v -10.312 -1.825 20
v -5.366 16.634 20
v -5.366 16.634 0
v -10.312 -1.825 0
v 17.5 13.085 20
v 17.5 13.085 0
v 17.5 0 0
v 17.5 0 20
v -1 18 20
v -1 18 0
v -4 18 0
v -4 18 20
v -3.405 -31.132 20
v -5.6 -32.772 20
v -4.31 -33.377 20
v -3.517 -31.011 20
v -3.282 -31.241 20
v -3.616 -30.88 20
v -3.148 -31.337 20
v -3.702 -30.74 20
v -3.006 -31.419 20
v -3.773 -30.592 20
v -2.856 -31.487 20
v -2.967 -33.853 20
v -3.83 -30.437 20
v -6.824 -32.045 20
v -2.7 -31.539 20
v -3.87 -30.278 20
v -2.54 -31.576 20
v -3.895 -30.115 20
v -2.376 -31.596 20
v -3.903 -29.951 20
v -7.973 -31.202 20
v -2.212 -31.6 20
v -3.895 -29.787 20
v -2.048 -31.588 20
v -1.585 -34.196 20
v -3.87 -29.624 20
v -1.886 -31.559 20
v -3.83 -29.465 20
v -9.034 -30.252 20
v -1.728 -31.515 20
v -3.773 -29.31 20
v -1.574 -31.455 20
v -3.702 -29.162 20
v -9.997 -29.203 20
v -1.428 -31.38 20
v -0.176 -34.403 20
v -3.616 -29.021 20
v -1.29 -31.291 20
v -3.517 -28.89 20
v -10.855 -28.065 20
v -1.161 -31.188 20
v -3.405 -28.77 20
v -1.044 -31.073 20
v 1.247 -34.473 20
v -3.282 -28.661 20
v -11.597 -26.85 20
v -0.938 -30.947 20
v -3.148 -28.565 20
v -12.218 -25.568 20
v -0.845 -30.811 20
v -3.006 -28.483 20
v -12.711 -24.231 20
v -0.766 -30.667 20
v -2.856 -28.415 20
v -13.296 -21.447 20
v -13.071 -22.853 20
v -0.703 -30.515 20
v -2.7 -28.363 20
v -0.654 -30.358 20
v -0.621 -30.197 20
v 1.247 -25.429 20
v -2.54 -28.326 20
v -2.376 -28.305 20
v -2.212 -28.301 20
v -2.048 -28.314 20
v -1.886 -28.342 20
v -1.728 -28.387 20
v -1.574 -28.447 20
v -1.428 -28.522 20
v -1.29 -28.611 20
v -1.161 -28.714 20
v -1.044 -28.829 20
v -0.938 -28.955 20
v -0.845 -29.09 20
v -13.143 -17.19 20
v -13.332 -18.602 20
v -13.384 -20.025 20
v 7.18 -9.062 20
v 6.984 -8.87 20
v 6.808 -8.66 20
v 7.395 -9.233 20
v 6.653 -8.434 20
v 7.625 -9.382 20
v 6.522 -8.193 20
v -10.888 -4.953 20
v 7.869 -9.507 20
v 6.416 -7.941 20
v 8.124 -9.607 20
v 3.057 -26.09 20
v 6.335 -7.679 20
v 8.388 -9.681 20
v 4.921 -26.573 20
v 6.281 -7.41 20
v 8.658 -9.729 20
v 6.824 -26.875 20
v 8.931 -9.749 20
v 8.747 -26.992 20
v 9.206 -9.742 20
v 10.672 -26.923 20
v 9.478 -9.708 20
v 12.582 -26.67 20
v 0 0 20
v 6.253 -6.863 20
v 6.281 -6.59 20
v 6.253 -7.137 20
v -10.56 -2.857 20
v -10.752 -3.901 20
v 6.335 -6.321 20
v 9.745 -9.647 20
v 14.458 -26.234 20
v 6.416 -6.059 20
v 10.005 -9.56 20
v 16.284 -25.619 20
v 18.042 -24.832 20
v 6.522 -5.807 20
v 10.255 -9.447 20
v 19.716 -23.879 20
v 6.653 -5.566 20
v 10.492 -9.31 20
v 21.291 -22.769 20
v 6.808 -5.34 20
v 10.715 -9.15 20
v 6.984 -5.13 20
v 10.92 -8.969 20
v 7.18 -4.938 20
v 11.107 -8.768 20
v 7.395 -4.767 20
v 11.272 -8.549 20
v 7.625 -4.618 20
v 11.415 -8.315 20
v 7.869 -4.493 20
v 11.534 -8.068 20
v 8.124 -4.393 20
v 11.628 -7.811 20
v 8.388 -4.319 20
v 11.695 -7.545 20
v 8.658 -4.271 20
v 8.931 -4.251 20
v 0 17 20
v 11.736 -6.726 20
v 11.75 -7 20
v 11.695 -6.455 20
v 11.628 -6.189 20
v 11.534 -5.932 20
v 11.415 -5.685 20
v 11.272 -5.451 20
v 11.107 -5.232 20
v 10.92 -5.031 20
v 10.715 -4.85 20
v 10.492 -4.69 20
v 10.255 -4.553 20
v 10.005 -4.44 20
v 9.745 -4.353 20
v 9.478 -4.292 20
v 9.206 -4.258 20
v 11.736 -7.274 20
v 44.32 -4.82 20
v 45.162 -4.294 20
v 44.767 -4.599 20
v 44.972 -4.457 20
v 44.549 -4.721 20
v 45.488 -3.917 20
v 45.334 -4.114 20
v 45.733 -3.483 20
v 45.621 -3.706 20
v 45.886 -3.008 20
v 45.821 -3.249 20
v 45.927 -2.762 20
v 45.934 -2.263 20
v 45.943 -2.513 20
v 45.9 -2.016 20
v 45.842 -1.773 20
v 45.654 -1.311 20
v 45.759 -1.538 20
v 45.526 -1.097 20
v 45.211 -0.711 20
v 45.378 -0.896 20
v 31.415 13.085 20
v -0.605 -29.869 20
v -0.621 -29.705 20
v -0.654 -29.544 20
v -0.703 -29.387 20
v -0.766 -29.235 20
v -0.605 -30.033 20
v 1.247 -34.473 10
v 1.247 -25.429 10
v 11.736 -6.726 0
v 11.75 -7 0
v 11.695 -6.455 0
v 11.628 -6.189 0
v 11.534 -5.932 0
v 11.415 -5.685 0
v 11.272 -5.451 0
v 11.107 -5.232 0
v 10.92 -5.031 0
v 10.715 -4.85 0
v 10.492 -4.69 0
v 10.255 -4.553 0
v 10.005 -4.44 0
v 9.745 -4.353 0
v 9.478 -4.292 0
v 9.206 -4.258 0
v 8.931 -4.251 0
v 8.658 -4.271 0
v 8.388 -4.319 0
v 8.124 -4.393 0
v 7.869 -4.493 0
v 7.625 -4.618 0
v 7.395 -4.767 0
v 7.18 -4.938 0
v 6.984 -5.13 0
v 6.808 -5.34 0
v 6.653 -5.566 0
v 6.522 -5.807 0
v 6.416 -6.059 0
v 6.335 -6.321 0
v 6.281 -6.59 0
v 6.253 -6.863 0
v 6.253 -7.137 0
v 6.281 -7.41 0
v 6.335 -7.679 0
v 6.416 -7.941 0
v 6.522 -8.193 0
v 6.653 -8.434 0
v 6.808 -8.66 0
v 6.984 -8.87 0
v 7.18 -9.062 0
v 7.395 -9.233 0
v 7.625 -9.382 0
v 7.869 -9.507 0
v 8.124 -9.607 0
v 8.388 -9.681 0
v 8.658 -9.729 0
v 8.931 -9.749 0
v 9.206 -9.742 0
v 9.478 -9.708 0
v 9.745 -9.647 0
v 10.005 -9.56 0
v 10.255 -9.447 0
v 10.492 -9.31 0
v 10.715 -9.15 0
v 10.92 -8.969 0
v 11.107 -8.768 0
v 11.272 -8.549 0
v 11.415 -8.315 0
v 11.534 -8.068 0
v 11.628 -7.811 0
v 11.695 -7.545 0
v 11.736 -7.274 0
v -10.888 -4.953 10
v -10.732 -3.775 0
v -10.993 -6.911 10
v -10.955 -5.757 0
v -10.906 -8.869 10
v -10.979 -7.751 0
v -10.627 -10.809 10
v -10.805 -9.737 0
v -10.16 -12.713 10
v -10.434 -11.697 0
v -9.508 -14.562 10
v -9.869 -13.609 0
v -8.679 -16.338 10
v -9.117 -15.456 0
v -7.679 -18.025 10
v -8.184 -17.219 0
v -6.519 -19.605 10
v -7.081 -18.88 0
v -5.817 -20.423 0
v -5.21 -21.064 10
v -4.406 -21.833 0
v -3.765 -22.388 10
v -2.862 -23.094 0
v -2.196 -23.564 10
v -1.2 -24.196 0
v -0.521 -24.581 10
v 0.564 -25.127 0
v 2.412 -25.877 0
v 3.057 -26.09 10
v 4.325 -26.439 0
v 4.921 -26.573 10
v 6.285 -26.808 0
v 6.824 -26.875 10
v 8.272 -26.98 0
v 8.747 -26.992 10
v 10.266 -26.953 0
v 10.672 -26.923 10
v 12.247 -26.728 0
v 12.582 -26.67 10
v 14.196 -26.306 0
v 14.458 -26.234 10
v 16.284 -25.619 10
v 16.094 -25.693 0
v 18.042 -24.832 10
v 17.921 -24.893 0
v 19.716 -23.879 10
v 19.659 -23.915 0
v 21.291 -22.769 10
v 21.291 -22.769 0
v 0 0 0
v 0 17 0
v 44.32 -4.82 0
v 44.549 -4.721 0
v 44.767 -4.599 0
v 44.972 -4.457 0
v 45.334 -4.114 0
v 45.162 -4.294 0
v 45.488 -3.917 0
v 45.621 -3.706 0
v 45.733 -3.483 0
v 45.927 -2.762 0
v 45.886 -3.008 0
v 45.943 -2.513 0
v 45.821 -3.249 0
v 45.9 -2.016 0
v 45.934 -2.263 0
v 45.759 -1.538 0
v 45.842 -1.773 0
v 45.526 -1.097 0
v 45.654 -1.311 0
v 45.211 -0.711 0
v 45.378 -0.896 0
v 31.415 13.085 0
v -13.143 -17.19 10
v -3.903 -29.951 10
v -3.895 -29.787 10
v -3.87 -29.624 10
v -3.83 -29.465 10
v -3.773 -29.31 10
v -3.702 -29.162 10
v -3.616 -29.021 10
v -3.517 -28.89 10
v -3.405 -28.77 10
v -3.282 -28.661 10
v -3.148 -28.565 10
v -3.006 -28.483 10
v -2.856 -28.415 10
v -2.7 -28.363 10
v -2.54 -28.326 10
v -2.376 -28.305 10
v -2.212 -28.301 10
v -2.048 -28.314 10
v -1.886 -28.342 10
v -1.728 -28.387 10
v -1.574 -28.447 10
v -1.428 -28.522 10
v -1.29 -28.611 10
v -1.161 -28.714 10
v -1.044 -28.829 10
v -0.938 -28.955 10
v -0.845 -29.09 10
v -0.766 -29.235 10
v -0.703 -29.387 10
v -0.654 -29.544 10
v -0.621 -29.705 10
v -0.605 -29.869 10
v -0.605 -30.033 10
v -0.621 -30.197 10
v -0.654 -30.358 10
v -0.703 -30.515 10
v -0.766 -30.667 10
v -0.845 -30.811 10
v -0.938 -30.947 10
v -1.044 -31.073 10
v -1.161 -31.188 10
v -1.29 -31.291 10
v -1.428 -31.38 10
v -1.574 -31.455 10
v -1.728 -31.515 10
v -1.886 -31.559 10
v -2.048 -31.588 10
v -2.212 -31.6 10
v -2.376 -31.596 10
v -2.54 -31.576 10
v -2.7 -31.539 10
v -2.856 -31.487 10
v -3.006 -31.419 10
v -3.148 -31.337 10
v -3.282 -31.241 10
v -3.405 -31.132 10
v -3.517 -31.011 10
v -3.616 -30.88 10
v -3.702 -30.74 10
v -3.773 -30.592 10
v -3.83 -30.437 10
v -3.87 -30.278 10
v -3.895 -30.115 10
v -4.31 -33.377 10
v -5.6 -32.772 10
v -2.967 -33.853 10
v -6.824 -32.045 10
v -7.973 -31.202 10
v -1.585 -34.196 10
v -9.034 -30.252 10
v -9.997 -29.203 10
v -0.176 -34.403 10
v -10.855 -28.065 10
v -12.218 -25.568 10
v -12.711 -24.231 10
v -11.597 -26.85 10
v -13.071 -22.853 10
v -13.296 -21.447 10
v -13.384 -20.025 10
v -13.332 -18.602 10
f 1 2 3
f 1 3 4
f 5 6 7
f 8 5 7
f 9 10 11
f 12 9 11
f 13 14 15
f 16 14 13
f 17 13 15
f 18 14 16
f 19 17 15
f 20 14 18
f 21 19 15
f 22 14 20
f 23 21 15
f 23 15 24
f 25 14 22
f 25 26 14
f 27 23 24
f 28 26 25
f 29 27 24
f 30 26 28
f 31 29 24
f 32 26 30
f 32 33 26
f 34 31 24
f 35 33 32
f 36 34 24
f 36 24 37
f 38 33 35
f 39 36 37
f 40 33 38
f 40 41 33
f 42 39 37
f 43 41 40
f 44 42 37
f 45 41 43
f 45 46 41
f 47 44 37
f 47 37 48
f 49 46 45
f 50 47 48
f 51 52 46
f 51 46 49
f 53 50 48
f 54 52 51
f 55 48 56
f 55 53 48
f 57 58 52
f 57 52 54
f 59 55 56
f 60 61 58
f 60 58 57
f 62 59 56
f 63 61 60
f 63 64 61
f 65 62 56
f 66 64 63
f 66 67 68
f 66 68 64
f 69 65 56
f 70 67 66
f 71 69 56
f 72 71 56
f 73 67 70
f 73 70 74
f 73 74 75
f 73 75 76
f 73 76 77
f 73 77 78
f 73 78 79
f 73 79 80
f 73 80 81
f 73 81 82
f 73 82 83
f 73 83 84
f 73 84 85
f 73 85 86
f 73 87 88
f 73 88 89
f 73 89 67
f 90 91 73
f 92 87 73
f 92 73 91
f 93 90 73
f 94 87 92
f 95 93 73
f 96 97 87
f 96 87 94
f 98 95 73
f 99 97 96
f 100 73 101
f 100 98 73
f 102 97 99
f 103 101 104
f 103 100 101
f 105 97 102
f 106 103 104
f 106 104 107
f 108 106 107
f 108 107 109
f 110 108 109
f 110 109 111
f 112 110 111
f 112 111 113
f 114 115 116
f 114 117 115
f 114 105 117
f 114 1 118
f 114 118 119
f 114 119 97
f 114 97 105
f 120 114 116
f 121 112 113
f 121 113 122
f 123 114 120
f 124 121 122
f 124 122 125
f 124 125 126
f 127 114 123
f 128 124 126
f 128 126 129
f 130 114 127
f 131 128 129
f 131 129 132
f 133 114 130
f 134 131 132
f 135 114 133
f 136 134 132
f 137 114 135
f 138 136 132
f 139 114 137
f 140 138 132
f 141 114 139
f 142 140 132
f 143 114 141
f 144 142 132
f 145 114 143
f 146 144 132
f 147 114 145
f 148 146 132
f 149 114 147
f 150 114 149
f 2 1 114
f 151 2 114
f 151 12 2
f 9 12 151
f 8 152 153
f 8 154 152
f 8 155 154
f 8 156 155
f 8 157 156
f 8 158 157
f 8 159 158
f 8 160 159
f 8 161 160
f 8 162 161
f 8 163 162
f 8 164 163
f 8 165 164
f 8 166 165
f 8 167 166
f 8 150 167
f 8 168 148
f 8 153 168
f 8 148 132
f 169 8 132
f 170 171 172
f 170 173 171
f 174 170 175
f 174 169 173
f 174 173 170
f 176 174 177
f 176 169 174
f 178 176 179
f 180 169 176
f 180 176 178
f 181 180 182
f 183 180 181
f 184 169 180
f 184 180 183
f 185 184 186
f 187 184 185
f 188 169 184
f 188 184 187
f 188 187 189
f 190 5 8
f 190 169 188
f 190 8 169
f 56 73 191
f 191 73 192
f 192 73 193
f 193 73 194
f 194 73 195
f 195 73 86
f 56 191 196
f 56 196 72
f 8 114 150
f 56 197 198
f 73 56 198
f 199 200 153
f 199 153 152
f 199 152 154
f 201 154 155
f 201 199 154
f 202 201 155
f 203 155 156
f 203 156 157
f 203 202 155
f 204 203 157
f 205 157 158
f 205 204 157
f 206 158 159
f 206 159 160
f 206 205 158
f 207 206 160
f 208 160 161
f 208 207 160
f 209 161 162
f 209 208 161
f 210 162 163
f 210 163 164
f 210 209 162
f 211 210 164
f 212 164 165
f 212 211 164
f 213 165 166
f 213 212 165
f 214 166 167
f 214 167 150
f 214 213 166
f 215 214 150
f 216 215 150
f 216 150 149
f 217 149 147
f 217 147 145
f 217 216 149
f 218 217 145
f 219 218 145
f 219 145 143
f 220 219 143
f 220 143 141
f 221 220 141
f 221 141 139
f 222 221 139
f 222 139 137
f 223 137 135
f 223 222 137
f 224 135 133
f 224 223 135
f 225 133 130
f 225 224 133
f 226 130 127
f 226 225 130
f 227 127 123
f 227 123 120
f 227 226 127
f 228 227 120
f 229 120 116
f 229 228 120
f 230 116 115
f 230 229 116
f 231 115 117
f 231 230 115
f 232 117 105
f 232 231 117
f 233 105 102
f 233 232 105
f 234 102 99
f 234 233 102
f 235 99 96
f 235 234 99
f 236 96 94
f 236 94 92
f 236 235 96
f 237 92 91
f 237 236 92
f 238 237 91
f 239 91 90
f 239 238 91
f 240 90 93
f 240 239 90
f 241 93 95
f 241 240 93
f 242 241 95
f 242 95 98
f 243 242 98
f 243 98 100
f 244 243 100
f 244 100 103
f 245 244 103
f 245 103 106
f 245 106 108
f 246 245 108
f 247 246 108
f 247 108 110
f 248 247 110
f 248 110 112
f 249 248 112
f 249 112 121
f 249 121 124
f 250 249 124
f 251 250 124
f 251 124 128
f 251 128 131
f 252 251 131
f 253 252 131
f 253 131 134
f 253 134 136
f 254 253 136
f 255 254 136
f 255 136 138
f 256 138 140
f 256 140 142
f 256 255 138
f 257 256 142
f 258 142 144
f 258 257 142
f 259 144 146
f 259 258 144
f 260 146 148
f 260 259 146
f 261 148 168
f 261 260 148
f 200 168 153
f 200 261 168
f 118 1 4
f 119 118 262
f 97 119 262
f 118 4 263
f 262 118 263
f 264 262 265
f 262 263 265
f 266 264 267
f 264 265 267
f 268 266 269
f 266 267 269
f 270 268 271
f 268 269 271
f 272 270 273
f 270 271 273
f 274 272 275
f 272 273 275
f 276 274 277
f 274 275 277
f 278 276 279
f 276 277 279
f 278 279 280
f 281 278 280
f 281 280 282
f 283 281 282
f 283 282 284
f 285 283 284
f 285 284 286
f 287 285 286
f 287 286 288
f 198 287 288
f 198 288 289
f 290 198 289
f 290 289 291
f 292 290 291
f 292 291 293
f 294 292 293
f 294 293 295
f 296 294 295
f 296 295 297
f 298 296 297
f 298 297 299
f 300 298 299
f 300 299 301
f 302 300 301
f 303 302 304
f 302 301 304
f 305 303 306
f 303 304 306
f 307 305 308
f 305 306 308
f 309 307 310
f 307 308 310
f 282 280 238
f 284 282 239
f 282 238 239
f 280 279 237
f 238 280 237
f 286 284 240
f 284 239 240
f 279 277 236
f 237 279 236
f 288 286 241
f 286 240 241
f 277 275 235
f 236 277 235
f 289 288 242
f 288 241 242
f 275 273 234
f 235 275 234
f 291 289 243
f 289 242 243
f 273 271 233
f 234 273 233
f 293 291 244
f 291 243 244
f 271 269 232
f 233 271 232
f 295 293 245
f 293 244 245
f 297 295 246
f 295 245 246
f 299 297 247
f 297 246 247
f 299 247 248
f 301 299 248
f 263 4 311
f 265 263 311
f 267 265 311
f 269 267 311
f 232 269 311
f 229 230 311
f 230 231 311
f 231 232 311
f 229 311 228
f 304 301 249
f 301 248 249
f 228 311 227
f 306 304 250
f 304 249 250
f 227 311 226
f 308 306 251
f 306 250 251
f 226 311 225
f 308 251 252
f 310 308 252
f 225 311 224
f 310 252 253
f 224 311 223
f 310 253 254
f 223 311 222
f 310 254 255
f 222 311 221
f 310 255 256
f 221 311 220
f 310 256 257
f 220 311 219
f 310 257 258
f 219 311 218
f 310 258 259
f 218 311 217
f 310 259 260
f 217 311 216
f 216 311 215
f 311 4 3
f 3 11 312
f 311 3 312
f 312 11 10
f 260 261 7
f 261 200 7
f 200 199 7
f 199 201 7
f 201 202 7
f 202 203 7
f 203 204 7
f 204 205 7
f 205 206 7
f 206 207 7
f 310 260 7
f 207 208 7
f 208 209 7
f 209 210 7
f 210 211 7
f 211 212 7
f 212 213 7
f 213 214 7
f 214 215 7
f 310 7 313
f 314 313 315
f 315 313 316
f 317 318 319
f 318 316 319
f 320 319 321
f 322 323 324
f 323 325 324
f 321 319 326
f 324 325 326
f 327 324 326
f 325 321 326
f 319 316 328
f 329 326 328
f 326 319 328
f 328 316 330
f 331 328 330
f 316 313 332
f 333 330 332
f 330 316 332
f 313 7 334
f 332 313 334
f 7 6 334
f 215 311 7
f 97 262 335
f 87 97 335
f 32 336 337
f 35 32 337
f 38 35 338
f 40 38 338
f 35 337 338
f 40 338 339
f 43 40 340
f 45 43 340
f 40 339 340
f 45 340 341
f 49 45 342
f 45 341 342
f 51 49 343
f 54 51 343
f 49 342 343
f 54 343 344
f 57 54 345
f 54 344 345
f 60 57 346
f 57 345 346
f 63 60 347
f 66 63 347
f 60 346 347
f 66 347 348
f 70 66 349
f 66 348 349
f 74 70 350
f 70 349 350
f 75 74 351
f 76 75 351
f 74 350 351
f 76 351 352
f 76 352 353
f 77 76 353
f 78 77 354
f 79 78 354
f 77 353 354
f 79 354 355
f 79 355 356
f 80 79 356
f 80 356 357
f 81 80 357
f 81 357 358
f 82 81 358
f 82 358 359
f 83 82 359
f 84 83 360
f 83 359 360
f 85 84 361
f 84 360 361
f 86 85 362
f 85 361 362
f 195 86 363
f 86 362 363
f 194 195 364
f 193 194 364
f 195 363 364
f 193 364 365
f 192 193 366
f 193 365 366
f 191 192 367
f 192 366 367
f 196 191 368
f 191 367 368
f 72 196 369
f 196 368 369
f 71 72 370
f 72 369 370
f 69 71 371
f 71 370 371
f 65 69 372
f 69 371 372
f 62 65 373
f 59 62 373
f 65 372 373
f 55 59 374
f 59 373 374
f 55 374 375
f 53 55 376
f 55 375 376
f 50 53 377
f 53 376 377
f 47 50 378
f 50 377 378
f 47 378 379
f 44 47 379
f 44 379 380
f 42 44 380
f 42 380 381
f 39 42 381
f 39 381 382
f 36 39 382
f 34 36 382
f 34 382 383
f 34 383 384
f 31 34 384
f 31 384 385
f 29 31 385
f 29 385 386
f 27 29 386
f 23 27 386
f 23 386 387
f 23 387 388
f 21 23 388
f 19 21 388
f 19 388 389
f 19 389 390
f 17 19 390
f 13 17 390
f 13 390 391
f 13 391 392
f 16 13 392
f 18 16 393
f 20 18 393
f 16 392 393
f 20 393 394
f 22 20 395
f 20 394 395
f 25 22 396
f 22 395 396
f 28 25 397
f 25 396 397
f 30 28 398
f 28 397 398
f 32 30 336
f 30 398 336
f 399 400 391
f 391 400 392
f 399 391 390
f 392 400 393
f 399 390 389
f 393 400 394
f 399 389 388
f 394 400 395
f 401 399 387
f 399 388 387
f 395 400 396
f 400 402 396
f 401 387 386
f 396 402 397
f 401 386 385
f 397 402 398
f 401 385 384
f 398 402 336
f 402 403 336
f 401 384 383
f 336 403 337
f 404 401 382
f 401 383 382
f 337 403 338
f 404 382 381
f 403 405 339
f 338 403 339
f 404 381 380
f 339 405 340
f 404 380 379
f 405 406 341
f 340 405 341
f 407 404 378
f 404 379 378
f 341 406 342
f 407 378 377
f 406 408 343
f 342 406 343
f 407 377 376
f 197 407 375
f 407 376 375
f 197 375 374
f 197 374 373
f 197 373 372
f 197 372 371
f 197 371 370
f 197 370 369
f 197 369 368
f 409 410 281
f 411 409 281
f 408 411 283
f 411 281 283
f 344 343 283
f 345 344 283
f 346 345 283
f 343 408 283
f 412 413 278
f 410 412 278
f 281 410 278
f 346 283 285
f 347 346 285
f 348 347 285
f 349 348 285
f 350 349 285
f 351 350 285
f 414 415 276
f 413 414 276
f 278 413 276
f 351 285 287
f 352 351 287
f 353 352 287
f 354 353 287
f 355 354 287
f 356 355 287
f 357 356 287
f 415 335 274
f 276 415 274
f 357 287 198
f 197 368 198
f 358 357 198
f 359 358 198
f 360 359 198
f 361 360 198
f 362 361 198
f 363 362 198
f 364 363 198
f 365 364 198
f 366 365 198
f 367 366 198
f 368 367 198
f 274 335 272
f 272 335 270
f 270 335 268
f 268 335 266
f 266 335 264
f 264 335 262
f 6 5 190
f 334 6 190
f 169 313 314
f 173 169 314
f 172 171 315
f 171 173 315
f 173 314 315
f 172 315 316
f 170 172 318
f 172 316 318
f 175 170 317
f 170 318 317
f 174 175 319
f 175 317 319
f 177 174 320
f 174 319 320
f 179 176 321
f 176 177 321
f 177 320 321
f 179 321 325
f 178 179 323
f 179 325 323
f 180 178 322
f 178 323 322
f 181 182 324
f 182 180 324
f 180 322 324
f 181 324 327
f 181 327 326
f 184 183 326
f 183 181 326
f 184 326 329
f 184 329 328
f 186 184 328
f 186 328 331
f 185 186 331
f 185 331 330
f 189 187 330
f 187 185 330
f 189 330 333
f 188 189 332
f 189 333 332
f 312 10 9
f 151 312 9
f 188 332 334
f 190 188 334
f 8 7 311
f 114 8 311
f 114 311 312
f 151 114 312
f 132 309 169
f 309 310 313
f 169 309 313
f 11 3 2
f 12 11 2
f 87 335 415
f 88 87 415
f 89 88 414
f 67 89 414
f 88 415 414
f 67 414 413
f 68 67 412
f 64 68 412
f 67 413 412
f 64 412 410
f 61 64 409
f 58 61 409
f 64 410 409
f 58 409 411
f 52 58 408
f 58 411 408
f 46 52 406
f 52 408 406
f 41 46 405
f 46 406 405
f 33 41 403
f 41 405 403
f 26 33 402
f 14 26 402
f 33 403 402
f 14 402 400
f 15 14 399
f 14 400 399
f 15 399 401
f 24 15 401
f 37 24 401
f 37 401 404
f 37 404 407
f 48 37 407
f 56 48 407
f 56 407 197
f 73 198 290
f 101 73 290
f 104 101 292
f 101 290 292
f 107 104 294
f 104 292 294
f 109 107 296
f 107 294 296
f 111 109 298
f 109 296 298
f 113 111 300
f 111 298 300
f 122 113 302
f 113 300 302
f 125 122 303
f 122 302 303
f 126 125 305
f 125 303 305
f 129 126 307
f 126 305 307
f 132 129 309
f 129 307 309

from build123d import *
from OCP.BRepFilletAPI import BRepFilletAPI_MakeChamfer

# Parameters (mm, degrees)
SKETCH_1_R          = 2.75
EXTRUDE_1_DEPTH     = 20
CHAMFER_1_SIZE      = 1
CHAMFER_1_SIZE2     = 1.414213562
FILLET_1_R          = 2.5
SKETCH_2_W          = 28.23976686
SKETCH_2_H          = 12.215936495
CUT_EXTRUDE_1_DEPTH = 57.915812899
EXTRUDE_START       = -10
EXTRUDE_2_DEPTH     = 10
SKETCH_4_R          = 1.65
CUT_EXTRUDE_2_DEPTH = 10


with BuildPart() as part:
    # 草图1 → 凸台-拉伸1 (new body)
    with BuildSketch(Plane.XY):
        with BuildLine():
            Line((0, 0), (0, 18))
            Line((0, 18), (-5, 18))
            Line((-5, 18), (-10.312177826, -1.825317547))
            ThreePointArc((-10.312177826, -1.825317547), (-2.044709461, -23.66589163), (21.291049633, -22.769199403))
            Line((21.291049633, -22.769199403), (44.319805153, -4.819805153))
            Line((44.319805153, -4.819805153), (49.319805153, -4.819805153))
            Line((49.319805153, -4.819805153), (17.5, 27))
            Line((17.5, 27), (17.5, 0))
            Line((17.5, 0), (0, 0))
        make_face()
        with Locations((9, -7)):
            Circle(SKETCH_1_R, mode=Mode.SUBTRACT)
    extrude(amount=EXTRUDE_1_DEPTH)

    # 倒角1: one chamfer whose edges measure the first distance from different faces: ONE call of the kernel's chamfer builder (chamfer() names one face for all edges)
    chamfer_1_edges_1 = [part.edges().sort_by_distance(p)[0] for p in [
        (-5, 18, 10),
    ]]
    chamfer_1_side_1 = [part.faces().sort_by_distance(p)[0] for p in [
        (-2.5, 18, 10),
    ]]
    chamfer_1_edges_2 = [part.edges().sort_by_distance(p)[0] for p in [
        (0, 18, 10),
    ]]
    chamfer_1 = BRepFilletAPI_MakeChamfer(part.part.solid().wrapped)
    for e in chamfer_1_edges_1:
        chamfer_1.Add(CHAMFER_1_SIZE, CHAMFER_1_SIZE2, e.wrapped, chamfer_1_side_1[0].wrapped)  # the first distance lies on this face
    for e in chamfer_1_edges_2:
        chamfer_1.Add(CHAMFER_1_SIZE, e.wrapped)
    add(Compound.cast(chamfer_1.Shape()), mode=Mode.REPLACE)

    # 圆角1
    # the kernel refuses this fillet: 2.5 mm, written as the material it takes off along each edge
    with BuildSketch(Plane(origin=(17.5, 27, -15.088834765), x_dir=(0, -1, 0), z_dir=(0, 0, 1))) as fillet_1_piece_1:
        with BuildLine():
            CenterArc((FILLET_1_R * 2.41421356237, FILLET_1_R), FILLET_1_R, 135, 135)
            Line((FILLET_1_R * 1.70710678119, FILLET_1_R * 1.70710678119), (FILLET_1_R * 1.69296464556, FILLET_1_R * 1.72124891681))
            Line((FILLET_1_R * 1.69296464556, FILLET_1_R * 1.72124891681), (-FILLET_1_R * 0.0141421356237, FILLET_1_R * 0.0141421356237))
            Line((-FILLET_1_R * 0.0141421356237, FILLET_1_R * 0.0141421356237), (0, -FILLET_1_R * 0.02))
            Line((0, -FILLET_1_R * 0.02), (FILLET_1_R * 2.41421356237, -FILLET_1_R * 0.02))
            Line((FILLET_1_R * 2.41421356237, -FILLET_1_R * 0.02), (FILLET_1_R * 2.41421356237, 0))
        make_face()
    extrude(amount=50.17766953, mode=Mode.SUBTRACT)
    with BuildSketch(Plane(origin=(49.319805153, -4.819805153, -14.527458022), x_dir=(-0.7071067811865513, 0.7071067811865437, 0), z_dir=(0, 0, 1))) as fillet_1_piece_2:
        with BuildLine():
            CenterArc((5.810983209, 2.5), FILLET_1_R, 155.530199479, 114.469800521)
            Line((3.535533906, 3.535533906), (3.49002492, 3.556244584))
            ThreePointArc((3.49002492, 3.556244584), (1.732411614, 1.803122292), (-0.035355339, 0.035355339))
            Line((-0.035355339, 0.035355339), (0, -0.05))
            Line((0, -0.05), (5.810983209, -0.05))
            Line((5.810983209, -0.05), (5.810983209, 0))
        make_face()
    extrude(amount=49.054916044, mode=Mode.SUBTRACT)

    # 草图2 → 切除-拉伸1 (cut, through all)
    with BuildSketch(Plane.XY.offset(20)):
        with Locations((31.61988343, 19.192534099)):
            Rectangle(SKETCH_2_W, SKETCH_2_H)
    extrude(amount=-CUT_EXTRUDE_1_DEPTH, mode=Mode.SUBTRACT)

    # 草图3 → 凸台-拉伸2 (add)
    with BuildSketch(Plane.XY.offset(20).offset(EXTRUDE_START)):
        with BuildLine():
            ThreePointArc((21.291049633, -22.769199403), (-0.684147296, -24.491564883), (-10.888388441, -4.953159484))
            Line((-10.888388441, -4.953159484), (-13.142676364, -17.190102226))
            ThreePointArc((-13.142676364, -17.190102226), (-6.344046, -32.349558271), (10.241880352, -31.381297238))
            Line((10.241880352, -31.381297238), (21.291049633, -22.769199403))
        make_face()
    extrude(amount=EXTRUDE_2_DEPTH)

    # 草图4 → 切除-拉伸2 (cut)
    with BuildSketch(Plane(origin=(0, 0, 10), x_dir=(-1, 0, 0), z_dir=(0, 0, -1))):
        with Locations((2.25305307, -29.950852035)):
            Circle(SKETCH_4_R)
        with BuildLine():
            Line((-1.24694693, -34.472712807), (-1.24694693, -25.428991263))
            ThreePointArc((-1.24694693, -25.428991263), (-11.630014522, -26.819701675), (-21.291049633, -22.769199403))
            Line((-21.291049633, -22.769199403), (-10.241880352, -31.381297238))
            ThreePointArc((-10.241880352, -31.381297238), (-6.002619266, -33.678292696), (-1.24694693, -34.472712807))
        make_face()
    extrude(amount=-CUT_EXTRUDE_2_DEPTH, mode=Mode.SUBTRACT)


solid = part.part
